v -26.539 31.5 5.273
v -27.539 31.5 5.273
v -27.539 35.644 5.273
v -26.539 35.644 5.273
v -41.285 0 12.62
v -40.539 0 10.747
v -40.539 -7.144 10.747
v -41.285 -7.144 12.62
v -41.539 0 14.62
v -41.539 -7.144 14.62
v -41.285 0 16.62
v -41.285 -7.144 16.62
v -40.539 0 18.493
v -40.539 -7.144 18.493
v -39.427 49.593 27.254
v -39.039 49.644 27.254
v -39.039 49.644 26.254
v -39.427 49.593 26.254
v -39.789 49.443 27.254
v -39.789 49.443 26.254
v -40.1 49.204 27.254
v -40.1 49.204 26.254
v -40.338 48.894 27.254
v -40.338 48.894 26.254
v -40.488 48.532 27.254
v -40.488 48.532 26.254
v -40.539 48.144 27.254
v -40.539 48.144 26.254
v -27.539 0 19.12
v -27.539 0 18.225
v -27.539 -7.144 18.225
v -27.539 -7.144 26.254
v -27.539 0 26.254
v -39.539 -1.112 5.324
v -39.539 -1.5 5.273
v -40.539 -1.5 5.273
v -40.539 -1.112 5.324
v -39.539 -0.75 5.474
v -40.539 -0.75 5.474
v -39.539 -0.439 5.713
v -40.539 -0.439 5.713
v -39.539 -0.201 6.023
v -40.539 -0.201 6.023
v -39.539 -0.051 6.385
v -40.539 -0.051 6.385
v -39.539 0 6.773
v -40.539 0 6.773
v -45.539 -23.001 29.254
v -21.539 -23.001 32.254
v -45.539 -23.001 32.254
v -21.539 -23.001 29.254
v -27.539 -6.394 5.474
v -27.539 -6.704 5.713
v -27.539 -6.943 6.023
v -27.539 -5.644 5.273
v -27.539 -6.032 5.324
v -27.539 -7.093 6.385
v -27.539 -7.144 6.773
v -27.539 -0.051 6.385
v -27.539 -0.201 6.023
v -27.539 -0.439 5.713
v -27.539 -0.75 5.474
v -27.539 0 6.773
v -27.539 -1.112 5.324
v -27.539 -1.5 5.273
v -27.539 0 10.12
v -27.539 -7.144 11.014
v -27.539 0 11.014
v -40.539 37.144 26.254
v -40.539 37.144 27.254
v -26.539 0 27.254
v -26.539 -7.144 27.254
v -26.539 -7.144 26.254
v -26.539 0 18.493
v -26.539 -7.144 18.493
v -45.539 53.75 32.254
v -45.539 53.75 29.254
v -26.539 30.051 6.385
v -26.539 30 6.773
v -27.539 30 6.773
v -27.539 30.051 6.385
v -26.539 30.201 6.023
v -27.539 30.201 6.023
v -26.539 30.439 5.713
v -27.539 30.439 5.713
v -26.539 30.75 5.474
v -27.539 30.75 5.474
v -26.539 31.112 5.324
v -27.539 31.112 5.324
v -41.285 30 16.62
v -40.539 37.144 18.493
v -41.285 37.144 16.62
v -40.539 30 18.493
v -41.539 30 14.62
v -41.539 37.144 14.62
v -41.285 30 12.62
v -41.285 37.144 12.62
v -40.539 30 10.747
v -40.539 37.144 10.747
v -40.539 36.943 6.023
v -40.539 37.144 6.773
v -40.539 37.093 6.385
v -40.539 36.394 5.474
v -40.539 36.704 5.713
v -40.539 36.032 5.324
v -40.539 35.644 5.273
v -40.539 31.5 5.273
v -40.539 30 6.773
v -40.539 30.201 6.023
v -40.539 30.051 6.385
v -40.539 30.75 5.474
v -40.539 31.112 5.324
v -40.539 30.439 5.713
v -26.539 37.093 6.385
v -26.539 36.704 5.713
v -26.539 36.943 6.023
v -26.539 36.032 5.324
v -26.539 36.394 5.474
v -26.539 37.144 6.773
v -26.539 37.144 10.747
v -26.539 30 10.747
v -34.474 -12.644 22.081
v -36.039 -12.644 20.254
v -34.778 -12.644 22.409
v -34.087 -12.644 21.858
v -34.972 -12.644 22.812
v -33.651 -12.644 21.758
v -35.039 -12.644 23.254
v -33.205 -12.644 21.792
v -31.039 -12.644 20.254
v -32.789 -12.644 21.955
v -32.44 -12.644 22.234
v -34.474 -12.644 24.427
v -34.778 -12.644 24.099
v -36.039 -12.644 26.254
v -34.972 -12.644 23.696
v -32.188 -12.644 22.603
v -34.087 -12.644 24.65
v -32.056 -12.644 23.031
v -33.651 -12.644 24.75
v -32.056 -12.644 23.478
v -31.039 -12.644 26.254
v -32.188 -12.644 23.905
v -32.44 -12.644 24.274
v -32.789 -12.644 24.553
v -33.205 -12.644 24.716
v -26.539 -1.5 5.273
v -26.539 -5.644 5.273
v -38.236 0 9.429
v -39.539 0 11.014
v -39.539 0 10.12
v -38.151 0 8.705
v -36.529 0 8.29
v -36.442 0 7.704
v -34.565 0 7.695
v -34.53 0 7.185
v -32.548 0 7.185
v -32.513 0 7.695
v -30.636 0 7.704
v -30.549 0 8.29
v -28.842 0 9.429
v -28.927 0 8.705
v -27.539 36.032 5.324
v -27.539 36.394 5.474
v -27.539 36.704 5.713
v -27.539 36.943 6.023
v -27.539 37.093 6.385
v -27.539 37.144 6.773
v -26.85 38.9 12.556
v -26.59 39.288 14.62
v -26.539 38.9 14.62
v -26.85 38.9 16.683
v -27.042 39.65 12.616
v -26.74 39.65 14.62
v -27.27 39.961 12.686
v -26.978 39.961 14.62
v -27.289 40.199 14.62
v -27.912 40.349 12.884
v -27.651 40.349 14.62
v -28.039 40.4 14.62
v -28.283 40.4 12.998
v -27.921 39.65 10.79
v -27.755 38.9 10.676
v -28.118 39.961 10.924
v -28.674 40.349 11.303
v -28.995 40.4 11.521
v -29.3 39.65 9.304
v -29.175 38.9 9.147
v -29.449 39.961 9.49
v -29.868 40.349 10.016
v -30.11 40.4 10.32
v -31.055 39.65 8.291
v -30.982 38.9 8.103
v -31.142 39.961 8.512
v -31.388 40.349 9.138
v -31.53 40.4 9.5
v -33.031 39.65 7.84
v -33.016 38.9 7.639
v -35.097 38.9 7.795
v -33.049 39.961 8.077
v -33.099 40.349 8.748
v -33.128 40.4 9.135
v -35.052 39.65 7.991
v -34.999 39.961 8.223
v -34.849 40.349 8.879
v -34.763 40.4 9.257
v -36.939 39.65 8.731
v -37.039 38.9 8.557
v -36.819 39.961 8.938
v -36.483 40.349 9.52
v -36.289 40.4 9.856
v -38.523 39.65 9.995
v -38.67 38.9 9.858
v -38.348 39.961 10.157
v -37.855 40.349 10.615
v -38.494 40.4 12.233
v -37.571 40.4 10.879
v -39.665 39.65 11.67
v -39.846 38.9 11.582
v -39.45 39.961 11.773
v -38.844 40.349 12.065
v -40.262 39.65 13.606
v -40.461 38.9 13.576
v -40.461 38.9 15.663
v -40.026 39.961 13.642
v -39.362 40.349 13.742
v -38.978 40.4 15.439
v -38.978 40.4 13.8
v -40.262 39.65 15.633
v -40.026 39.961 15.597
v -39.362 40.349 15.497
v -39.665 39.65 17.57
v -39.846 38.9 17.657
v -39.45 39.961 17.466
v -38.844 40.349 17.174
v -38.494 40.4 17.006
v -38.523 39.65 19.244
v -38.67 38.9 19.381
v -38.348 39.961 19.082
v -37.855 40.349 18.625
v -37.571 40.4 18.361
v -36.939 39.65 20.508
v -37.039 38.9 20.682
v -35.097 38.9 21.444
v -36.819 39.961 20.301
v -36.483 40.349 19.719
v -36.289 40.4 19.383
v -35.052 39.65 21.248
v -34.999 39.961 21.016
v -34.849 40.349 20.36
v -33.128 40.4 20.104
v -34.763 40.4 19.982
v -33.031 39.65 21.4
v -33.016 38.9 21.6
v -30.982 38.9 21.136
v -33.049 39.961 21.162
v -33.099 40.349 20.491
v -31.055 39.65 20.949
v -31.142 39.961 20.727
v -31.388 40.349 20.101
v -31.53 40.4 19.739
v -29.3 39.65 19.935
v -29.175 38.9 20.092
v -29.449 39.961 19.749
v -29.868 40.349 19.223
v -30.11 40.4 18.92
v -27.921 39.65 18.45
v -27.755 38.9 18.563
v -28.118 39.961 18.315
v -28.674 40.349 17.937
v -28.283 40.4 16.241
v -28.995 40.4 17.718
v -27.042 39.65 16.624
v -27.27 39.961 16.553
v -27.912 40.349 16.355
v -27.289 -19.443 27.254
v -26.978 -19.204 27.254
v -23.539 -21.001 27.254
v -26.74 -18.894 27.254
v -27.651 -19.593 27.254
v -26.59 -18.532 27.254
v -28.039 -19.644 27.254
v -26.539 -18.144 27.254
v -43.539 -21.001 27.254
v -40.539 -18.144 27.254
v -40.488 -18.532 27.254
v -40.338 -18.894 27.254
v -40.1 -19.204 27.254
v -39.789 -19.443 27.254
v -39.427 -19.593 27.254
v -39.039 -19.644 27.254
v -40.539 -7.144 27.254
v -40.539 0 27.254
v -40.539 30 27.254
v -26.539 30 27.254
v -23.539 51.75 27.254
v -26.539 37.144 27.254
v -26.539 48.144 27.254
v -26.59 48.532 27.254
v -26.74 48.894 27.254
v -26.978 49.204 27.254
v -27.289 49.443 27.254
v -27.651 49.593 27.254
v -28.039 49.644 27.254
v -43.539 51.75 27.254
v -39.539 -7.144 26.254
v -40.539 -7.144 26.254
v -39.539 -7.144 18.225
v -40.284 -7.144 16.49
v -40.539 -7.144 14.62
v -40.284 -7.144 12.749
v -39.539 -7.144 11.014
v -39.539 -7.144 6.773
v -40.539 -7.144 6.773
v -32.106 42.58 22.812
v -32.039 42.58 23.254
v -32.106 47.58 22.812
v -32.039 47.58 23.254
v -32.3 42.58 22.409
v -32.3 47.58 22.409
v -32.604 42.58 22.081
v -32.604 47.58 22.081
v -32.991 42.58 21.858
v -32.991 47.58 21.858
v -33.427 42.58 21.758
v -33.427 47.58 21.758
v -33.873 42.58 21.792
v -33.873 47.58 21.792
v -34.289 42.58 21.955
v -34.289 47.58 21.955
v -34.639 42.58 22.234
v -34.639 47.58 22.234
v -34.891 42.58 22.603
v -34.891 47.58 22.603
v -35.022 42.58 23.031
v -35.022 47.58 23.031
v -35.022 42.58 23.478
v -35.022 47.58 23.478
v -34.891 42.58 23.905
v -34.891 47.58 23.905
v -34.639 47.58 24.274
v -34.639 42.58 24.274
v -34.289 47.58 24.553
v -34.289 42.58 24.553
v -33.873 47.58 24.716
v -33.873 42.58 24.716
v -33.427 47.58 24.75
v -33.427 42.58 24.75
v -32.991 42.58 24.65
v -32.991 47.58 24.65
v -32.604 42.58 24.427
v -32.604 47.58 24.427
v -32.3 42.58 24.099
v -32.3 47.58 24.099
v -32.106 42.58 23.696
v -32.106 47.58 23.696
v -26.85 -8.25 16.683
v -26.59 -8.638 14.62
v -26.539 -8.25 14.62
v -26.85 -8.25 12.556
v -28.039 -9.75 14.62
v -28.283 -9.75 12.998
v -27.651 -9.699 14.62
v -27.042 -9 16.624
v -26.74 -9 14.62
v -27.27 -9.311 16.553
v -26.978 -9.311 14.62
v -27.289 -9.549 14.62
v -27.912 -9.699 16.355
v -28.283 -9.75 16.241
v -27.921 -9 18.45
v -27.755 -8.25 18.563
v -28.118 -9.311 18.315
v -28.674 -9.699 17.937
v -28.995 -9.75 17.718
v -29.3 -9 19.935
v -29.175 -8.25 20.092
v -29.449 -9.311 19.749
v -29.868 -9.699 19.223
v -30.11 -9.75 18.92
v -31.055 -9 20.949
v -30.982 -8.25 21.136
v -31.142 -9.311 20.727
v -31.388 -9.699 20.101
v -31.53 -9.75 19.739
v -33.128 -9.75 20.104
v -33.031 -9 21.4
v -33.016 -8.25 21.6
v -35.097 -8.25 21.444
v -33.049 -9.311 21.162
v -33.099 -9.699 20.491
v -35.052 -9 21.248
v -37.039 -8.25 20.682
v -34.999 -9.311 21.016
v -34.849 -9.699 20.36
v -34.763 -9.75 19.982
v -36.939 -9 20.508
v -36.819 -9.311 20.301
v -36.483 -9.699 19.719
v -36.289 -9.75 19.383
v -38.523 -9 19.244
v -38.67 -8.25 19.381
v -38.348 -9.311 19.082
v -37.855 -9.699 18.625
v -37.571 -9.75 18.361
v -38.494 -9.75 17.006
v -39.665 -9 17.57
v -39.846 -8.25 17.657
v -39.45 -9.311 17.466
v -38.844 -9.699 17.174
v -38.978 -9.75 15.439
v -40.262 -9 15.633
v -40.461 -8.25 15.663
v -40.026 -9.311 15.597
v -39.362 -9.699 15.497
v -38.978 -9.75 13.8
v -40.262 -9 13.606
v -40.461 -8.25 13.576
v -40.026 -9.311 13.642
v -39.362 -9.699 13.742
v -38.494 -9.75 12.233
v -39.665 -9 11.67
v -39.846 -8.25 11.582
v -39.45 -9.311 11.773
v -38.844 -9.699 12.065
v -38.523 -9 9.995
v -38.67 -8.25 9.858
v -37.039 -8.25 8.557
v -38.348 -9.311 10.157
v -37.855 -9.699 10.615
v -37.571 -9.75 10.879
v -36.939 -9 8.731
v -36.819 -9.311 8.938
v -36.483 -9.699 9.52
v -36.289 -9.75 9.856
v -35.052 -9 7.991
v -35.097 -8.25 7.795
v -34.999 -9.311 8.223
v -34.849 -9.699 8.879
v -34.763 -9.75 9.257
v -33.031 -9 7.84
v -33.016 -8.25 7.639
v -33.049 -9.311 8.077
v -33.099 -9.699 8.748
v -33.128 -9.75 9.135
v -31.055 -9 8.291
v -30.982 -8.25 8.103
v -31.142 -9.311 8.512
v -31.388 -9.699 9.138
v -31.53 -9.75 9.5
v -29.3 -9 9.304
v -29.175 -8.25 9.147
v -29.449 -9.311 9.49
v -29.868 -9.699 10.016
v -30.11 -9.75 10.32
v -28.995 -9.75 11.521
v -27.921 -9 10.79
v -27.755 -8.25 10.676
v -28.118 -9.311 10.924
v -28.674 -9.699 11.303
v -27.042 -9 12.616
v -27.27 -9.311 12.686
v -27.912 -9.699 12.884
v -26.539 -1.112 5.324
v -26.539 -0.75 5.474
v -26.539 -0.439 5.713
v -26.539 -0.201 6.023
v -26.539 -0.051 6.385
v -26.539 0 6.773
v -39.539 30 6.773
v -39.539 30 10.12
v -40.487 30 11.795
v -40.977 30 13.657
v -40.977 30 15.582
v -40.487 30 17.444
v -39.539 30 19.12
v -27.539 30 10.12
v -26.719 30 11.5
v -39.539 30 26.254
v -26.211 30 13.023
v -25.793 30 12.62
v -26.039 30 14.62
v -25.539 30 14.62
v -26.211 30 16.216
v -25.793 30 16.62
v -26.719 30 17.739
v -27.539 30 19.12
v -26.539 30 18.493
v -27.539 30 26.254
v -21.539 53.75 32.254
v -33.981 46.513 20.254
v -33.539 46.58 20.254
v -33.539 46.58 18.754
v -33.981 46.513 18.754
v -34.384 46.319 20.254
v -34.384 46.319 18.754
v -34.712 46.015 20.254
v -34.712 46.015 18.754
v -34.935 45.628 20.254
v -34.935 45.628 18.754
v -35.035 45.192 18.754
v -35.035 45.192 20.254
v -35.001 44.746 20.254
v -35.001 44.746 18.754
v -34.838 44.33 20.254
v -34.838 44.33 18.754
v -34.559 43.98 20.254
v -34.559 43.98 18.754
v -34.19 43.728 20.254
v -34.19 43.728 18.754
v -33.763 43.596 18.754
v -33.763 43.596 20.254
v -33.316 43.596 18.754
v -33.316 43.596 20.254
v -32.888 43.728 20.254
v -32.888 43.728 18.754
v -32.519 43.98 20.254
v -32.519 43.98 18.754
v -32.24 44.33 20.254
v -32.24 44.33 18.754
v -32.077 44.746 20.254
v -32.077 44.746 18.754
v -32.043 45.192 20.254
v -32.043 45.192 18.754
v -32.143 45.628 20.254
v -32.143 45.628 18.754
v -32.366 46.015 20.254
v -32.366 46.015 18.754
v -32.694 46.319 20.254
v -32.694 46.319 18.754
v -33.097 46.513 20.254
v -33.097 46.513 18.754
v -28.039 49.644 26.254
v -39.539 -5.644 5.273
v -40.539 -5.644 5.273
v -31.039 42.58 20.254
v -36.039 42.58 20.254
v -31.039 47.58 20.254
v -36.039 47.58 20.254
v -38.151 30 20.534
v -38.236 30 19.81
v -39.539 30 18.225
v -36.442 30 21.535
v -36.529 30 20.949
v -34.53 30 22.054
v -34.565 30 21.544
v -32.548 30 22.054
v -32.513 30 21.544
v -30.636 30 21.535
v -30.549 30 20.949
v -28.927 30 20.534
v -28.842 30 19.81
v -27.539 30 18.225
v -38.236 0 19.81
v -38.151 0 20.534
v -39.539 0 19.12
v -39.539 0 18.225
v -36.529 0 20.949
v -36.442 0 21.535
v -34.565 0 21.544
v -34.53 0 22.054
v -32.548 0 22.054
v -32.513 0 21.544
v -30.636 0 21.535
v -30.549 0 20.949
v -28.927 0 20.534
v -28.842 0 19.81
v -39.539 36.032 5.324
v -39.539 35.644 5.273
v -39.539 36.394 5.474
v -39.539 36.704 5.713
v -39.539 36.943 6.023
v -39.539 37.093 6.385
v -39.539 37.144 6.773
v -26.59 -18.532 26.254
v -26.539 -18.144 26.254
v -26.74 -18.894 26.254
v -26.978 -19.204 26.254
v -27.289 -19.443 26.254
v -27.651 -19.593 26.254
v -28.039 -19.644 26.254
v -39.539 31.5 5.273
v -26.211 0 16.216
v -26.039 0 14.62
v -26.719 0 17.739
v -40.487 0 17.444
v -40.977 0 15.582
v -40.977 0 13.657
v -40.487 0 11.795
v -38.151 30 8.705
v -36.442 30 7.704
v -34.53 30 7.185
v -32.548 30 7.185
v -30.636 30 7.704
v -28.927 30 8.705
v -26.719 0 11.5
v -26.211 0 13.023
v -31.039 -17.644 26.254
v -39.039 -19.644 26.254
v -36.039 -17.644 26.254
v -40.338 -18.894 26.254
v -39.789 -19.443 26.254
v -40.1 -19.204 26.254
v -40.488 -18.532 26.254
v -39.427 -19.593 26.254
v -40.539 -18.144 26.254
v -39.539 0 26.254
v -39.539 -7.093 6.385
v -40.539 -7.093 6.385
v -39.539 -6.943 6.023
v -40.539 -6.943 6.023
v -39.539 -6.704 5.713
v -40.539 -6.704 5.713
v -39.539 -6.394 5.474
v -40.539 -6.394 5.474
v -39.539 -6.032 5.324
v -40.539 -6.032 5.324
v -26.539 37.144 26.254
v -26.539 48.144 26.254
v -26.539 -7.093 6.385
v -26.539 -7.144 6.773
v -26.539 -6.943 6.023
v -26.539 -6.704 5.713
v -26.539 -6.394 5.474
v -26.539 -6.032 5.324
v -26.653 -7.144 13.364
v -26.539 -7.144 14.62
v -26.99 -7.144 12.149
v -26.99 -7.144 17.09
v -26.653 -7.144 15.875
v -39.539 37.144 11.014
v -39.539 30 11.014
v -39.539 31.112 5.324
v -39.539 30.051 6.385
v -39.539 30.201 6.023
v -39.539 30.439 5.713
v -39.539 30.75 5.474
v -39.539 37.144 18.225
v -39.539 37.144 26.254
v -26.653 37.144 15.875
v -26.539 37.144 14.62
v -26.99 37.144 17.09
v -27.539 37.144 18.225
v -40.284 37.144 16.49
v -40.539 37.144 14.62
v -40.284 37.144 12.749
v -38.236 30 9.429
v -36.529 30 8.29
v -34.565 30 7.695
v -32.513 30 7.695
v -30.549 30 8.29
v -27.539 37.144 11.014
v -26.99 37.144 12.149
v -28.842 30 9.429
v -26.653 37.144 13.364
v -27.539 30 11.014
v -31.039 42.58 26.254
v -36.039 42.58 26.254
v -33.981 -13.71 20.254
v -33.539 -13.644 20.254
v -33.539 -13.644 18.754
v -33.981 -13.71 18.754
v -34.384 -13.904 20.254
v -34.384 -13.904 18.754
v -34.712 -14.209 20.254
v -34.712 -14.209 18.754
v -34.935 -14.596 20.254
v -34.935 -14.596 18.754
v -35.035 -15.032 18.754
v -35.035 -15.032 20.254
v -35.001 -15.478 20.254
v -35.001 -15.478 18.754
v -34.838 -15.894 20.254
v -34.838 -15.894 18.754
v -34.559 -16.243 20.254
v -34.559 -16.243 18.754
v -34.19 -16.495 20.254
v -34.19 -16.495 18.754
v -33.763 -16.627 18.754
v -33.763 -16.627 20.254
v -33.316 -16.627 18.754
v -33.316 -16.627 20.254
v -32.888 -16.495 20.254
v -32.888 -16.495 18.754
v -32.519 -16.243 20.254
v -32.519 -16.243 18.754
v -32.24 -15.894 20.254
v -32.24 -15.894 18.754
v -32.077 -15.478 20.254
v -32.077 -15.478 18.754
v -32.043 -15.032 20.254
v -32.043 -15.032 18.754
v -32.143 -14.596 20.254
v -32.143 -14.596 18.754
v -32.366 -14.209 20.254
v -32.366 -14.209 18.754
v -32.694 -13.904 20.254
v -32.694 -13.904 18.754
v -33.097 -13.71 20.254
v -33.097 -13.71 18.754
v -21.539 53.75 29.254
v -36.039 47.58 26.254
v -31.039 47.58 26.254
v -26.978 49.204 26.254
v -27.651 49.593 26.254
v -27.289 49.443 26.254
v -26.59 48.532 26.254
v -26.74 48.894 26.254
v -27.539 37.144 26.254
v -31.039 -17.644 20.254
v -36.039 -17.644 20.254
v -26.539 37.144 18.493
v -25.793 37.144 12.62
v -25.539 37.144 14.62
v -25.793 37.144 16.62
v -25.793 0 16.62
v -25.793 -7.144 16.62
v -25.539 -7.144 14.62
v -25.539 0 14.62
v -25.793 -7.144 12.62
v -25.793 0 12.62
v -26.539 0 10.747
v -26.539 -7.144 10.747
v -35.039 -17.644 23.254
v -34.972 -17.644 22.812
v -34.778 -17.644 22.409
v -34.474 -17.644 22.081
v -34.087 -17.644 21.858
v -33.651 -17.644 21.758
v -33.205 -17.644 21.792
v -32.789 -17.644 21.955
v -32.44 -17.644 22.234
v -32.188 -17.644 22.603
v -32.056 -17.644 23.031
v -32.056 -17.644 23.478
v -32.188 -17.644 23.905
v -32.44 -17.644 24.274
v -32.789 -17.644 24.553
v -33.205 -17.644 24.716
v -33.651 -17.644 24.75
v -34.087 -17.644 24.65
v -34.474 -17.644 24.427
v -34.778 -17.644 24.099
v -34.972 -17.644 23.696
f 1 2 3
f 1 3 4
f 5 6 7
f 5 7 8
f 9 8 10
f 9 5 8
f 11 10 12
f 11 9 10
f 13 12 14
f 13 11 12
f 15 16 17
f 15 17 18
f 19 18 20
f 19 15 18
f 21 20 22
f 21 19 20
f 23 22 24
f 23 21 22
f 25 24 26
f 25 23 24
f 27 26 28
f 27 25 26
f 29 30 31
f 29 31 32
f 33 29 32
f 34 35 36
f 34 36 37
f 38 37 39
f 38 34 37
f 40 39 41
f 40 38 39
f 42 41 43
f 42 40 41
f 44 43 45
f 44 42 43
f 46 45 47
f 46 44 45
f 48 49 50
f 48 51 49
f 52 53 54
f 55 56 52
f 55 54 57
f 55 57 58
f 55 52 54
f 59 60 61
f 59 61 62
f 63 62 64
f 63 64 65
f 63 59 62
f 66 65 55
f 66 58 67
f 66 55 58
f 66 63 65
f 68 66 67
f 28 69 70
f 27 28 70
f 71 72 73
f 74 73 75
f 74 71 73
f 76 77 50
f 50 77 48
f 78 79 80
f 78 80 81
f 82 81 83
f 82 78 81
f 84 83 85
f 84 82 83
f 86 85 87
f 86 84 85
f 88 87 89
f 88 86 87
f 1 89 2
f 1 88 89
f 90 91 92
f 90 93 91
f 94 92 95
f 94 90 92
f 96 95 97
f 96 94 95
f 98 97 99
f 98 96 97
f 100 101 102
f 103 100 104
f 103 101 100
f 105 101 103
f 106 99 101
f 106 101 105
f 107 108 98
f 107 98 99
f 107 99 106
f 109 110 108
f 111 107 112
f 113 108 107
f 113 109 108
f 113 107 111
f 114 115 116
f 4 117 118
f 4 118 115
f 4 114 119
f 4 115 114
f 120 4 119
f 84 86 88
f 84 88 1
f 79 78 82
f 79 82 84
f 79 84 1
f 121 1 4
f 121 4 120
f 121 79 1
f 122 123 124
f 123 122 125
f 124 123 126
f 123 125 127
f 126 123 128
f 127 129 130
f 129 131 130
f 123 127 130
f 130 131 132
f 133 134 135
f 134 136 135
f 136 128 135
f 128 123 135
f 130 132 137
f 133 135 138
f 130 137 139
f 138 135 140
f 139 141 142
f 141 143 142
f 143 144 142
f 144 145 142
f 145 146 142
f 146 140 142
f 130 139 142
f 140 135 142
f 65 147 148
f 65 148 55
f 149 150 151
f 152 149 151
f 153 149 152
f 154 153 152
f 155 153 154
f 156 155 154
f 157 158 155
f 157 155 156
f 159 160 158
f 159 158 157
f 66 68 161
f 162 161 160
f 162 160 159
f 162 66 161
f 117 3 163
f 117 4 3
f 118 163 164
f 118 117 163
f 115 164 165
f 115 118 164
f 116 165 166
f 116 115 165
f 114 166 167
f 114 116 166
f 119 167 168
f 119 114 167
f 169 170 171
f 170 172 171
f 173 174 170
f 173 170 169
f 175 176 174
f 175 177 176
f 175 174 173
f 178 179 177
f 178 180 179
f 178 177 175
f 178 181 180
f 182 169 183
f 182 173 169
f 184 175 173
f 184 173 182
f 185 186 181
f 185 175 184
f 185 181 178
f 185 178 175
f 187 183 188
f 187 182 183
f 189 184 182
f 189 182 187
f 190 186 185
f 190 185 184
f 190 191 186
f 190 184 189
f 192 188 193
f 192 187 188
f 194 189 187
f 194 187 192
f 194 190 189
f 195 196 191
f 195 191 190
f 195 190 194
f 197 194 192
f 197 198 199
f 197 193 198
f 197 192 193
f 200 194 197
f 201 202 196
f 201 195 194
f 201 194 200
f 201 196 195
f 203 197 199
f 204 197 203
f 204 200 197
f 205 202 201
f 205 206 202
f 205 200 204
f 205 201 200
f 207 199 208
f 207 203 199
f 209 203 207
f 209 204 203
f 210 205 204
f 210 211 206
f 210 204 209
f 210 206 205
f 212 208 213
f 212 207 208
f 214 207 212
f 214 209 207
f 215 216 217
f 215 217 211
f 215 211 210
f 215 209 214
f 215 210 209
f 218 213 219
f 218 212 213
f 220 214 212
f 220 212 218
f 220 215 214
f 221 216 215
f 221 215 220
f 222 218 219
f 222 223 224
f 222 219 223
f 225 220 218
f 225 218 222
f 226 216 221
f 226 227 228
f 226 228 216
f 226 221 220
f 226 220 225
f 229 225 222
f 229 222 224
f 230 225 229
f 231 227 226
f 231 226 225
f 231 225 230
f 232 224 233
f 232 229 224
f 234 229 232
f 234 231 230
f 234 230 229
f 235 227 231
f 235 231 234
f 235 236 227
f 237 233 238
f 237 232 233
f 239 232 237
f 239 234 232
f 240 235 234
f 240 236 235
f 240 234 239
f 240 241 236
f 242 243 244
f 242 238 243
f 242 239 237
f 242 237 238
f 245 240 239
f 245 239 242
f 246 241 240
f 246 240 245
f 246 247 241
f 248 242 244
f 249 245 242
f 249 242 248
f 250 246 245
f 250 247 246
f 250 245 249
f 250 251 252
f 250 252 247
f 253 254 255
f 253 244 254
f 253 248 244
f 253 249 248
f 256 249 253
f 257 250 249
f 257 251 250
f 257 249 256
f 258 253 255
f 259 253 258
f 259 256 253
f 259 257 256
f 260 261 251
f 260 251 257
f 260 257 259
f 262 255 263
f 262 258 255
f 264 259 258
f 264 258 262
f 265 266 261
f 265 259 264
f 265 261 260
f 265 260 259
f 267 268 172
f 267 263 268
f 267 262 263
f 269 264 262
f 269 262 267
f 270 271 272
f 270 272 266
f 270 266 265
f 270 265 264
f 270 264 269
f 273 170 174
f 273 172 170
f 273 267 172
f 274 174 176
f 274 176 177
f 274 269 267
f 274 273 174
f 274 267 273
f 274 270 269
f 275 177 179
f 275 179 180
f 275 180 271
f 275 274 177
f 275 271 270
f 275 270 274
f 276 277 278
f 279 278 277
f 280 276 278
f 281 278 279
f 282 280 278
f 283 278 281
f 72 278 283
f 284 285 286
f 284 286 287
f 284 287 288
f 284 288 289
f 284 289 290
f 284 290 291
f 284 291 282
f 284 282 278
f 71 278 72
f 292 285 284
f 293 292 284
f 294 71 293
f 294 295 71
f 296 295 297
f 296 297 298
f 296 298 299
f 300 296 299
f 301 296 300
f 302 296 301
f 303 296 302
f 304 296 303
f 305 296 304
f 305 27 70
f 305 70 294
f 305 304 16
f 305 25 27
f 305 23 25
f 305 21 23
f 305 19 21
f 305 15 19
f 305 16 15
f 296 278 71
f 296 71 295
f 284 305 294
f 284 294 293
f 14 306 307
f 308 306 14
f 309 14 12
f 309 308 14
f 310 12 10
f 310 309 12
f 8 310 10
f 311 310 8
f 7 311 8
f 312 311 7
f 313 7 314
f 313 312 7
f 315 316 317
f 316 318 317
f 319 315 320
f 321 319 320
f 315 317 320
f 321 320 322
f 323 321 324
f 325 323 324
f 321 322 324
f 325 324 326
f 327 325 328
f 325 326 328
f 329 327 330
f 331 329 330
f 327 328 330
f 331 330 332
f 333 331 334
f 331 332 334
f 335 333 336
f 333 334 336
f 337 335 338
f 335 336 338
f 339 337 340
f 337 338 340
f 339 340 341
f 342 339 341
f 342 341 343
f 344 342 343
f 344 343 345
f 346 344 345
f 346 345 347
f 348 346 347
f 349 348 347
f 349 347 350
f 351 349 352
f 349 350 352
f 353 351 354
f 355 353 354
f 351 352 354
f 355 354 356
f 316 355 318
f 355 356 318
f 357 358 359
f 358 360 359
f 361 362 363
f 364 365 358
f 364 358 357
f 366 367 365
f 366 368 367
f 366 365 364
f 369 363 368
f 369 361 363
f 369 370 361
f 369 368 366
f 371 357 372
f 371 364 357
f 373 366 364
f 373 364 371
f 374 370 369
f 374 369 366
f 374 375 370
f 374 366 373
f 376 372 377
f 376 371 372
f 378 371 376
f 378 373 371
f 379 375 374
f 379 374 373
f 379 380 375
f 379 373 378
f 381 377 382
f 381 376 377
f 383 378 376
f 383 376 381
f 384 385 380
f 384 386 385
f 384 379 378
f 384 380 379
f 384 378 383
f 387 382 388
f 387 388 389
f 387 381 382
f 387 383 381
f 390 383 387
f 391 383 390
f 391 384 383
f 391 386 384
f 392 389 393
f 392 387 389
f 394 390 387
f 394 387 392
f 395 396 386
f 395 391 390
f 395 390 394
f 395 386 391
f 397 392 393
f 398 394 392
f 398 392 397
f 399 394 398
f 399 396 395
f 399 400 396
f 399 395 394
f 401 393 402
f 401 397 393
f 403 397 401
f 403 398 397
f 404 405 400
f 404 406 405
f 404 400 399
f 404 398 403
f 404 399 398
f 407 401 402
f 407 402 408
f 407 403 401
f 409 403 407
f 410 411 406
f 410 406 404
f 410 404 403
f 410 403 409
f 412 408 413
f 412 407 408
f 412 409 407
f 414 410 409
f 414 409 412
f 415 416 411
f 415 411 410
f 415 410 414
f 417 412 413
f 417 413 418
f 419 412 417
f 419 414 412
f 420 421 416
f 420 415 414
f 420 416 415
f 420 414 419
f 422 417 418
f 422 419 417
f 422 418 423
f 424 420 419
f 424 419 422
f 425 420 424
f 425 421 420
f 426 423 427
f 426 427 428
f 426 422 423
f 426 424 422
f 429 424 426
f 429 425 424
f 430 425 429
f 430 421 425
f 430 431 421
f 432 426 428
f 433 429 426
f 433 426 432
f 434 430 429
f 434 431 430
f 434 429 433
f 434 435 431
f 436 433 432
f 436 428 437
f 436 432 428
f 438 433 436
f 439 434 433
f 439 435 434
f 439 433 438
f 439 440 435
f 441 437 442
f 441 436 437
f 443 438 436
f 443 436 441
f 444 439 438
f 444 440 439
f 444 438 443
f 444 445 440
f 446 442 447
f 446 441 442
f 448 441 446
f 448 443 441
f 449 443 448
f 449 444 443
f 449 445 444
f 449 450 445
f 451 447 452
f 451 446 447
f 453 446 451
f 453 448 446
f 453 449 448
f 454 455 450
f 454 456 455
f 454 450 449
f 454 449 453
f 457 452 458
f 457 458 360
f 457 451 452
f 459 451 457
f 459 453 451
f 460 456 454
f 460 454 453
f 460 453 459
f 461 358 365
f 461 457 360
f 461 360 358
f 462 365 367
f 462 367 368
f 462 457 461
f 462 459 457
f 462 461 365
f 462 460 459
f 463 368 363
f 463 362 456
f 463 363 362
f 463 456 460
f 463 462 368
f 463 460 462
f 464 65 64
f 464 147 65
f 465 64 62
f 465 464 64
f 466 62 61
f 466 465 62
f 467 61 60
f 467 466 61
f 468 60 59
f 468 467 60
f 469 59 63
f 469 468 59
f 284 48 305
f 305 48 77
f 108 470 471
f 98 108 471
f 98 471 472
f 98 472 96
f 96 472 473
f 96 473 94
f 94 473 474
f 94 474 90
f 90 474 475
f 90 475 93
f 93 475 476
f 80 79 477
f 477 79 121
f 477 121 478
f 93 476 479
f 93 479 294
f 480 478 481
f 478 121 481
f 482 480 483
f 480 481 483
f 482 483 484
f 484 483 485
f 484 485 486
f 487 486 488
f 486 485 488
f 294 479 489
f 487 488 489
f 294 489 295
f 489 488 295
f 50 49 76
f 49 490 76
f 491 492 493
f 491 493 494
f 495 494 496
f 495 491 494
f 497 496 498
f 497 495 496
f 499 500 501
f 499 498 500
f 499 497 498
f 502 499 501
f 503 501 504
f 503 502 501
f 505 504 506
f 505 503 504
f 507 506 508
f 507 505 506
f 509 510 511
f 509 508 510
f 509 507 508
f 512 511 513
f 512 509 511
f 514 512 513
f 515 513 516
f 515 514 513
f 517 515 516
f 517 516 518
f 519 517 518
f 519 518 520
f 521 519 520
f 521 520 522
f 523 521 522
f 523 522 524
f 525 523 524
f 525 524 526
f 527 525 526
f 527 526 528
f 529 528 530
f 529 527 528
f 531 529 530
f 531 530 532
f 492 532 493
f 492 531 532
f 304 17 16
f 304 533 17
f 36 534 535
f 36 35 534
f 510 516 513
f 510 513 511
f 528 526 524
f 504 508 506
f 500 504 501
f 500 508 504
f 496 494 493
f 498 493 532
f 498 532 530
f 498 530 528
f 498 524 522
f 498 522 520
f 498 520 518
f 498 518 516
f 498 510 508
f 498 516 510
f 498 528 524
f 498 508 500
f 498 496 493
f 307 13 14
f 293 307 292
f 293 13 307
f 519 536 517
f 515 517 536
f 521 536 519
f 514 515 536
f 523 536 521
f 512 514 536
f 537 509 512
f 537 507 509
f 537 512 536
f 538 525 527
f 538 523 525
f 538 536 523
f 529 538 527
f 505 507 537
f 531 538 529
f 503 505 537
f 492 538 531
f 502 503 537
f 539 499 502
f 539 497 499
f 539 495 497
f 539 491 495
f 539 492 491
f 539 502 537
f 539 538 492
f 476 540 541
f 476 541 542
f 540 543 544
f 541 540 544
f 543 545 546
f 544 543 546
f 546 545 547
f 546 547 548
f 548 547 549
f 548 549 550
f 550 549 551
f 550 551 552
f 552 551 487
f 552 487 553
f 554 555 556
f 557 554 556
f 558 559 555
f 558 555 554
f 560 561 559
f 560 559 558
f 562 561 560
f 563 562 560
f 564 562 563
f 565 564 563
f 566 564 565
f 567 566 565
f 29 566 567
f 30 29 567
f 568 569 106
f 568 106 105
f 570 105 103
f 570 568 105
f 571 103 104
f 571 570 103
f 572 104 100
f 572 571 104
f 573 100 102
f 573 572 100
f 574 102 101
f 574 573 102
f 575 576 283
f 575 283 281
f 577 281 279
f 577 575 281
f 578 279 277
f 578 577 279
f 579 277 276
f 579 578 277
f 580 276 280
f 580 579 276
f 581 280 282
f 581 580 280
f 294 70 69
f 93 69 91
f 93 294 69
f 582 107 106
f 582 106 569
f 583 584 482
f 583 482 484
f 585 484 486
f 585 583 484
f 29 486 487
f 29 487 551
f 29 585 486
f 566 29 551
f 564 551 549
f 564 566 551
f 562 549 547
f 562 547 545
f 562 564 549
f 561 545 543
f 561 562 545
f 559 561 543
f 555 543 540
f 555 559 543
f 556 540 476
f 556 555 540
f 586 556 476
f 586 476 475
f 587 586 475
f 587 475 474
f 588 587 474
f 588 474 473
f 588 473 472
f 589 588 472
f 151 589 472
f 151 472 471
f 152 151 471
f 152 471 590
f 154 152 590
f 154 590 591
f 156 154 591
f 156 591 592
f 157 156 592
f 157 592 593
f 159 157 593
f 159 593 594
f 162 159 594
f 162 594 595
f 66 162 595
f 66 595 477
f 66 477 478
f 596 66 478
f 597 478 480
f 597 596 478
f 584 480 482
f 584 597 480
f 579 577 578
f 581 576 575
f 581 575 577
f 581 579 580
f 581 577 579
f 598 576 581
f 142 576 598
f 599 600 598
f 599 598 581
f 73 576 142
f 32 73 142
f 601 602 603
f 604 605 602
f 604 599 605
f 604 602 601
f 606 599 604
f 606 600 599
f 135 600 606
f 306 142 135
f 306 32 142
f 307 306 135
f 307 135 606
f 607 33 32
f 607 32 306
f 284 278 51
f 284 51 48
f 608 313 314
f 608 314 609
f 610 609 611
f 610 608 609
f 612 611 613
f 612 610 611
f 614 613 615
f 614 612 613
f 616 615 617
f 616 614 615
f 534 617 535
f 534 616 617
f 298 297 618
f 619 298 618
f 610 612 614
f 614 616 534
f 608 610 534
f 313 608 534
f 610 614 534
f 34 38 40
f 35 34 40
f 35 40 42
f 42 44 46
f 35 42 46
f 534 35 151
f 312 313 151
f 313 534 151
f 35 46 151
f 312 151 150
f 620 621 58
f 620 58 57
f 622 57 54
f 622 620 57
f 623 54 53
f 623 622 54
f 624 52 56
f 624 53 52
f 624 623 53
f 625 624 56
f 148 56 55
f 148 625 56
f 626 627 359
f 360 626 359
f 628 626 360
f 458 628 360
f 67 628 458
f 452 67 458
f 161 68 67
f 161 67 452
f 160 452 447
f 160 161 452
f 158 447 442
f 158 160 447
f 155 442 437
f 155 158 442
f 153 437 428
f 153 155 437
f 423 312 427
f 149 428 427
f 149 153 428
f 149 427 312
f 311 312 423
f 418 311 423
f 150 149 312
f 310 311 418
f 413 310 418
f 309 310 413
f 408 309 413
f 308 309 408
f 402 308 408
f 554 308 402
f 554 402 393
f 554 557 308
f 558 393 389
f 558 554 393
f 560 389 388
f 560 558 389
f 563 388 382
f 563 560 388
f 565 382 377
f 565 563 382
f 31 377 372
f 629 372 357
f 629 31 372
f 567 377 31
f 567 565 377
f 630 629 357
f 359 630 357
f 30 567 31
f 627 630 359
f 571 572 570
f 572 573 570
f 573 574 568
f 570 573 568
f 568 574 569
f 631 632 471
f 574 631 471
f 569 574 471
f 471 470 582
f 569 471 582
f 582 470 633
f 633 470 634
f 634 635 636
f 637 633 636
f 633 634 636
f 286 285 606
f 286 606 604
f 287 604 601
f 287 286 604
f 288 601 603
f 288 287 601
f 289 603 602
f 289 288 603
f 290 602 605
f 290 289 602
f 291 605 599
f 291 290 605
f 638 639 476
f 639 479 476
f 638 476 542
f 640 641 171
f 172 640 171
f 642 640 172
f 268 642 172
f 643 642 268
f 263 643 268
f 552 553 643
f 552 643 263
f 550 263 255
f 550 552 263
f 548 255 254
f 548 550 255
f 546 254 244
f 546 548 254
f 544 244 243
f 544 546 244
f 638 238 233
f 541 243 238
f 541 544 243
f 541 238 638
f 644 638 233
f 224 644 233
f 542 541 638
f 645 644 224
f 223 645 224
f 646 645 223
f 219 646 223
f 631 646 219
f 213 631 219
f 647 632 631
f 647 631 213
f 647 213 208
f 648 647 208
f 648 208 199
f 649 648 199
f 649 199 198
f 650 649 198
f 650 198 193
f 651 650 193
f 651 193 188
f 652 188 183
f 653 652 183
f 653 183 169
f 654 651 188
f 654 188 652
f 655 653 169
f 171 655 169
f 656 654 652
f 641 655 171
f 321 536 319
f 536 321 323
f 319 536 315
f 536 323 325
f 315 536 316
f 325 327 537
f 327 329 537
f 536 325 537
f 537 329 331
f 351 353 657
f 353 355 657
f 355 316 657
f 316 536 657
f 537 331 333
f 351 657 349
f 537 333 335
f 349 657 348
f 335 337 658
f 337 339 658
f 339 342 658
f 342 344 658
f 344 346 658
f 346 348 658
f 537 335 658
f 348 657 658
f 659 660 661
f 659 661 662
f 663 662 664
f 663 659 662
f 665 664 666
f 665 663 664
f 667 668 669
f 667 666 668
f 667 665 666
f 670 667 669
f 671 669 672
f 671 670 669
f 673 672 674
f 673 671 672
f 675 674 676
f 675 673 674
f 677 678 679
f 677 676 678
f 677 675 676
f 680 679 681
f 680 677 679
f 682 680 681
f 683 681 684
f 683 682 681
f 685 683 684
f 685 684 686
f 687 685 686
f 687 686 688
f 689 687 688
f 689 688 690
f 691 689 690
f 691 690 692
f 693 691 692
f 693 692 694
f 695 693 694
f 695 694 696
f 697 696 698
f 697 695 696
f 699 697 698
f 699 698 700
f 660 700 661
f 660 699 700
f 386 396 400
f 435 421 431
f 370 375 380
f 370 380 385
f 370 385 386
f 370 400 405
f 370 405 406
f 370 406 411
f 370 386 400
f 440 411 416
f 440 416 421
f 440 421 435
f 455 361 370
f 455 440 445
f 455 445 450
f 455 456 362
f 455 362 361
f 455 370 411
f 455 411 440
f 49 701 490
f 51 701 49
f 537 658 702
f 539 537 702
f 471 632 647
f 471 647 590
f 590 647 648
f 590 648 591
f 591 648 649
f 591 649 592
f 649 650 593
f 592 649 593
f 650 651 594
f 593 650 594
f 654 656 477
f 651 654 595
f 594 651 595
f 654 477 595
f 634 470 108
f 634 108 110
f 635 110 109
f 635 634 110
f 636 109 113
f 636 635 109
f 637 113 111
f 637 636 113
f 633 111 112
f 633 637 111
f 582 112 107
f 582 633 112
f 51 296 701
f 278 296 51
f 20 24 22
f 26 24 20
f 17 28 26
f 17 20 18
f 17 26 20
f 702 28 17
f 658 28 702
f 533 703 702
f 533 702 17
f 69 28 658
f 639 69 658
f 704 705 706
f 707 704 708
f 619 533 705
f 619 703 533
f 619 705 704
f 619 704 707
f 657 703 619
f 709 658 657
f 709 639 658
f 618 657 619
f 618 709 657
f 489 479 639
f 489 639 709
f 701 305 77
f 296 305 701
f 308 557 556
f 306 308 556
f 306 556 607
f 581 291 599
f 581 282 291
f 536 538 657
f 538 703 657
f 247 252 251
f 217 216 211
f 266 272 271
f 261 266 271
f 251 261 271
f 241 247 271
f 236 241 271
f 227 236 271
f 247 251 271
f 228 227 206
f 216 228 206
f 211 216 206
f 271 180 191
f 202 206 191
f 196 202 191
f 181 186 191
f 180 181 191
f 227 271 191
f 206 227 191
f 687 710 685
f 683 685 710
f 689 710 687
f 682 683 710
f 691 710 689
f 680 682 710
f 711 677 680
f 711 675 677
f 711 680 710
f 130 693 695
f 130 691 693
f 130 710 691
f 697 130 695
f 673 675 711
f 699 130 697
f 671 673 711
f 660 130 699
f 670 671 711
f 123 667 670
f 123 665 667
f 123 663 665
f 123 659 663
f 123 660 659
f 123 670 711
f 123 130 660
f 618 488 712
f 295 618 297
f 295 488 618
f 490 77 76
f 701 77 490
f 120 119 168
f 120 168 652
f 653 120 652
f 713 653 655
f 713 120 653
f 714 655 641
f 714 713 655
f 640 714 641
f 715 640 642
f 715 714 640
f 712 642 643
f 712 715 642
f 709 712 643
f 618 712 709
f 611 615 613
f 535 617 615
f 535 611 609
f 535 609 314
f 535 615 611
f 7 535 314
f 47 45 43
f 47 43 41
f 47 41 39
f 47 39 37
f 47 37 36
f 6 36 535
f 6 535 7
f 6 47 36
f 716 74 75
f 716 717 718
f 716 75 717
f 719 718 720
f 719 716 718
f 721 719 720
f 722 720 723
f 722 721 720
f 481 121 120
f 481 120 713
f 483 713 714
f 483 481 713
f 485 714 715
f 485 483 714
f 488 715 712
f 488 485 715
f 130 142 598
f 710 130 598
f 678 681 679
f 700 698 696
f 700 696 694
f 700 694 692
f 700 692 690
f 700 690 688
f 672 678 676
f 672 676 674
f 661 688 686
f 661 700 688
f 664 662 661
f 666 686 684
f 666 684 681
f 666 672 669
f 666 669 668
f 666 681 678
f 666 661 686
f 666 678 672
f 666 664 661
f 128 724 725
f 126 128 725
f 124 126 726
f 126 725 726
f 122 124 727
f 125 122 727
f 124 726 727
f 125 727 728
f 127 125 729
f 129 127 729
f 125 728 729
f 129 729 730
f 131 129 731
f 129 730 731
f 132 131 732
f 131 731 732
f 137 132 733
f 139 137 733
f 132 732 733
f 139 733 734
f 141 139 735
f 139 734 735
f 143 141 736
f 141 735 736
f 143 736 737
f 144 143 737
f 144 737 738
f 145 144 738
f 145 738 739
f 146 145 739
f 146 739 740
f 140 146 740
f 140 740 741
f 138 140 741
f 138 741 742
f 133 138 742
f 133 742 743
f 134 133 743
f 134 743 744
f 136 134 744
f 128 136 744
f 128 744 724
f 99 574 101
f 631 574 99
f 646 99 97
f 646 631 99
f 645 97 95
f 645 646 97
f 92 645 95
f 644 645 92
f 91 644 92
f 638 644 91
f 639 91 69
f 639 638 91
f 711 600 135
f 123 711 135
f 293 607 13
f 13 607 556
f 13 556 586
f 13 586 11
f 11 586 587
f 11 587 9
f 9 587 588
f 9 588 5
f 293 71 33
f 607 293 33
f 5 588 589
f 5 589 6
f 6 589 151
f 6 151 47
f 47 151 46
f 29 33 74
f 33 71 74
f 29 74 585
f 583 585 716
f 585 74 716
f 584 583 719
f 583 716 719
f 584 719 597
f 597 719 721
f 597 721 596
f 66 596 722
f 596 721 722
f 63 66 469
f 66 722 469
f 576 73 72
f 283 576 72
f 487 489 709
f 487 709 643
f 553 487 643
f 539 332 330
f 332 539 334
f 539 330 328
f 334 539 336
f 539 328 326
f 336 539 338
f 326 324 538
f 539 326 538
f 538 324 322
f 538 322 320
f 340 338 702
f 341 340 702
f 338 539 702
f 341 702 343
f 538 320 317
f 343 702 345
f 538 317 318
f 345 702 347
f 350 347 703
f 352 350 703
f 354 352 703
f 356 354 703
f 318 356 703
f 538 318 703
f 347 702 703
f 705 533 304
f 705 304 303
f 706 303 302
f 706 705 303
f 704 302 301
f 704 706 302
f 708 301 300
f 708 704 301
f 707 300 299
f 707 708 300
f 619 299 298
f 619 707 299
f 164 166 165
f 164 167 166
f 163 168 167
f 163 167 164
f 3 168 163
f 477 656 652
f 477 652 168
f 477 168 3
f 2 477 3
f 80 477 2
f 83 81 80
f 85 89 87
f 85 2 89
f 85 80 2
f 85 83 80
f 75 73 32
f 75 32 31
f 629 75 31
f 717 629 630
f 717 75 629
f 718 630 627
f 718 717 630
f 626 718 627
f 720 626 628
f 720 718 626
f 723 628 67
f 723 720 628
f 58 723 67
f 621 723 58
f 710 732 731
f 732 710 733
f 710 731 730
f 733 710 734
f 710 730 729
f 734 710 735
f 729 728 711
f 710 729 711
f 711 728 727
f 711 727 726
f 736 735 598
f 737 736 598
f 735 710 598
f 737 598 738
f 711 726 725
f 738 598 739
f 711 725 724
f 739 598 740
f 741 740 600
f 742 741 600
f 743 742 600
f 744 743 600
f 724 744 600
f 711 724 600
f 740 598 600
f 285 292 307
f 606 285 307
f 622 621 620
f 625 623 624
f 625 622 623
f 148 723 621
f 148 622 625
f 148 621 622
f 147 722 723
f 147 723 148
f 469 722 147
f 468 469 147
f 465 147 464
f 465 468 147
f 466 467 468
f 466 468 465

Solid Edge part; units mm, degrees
sketch "Sketch1" plane through (0, 0, 0) normal (0, -1, 0) x (1, 0, 0)
  circle A0 centre (-33.5391, 14.6196) radius 7.5
extrude "Protrusion1" add sketch "Sketch1" against normal blind 30
sketch "Sketch2" plane through (-33.5391, 0, 14.6196) normal (0, -1, 0) x (1, 0, 0)
  circle A0 centre (0, 0) radius 7
extrude "ExtrudedProtrusion_2" add sketch "Sketch2" along normal blind 9.75 and the other way blind 40.4
fillet "Round_1" radius 1.5 2 edges at (-40.5391, -9.75, 14.6196) (-40.5391, 40.4, 14.6196)
sketch "Sketch3" plane through (-33.5391, 30, 14.6196) normal (0, 1, 0) x (1, 0, 0)
  line L0 (-6, -11.6345) -> (-6, -3.6056)
  arc A0 (-6, -3.6056) -> (-6, 3.6056) centre (0, 0) cw
  line L1 (-6, 3.6056) -> (-6, 9.3463)
  line L2 (-7, 9.3463) -> (-6, 9.3463)
  line L3 (-7, 3.873) -> (-7, 9.3463)
  arc A1 (-7, -3.873) -> (-7, 3.873) centre (0, 0) cw
  line L4 (-7, -12.6345) -> (-7, -3.873)
  line L5 (7, -12.6345) -> (-7, -12.6345)
  line L6 (7, -3.873) -> (7, -12.6345)
  arc A2 (7, 3.873) -> (7, -3.873) centre (0, 0) cw
  line L7 (7, 9.3463) -> (7, 3.873)
  line L8 (6, 9.3463) -> (7, 9.3463)
  line L9 (6, 3.6056) -> (6, 9.3463)
  line L10 (6, -11.6345) -> (6, -3.6056)
  line L11 (-6, -11.6345) -> (6, -11.6345)
  arc A3 (6, 3.6056) -> (6, -3.6056) centre (0, 0) cw
extrude "ExtrudedProtrusion_3" add sketch "Sketch3" along normal blind 7.1438
sketch "Sketch4" plane through (-33.5391, 37.1438, 16.2637) normal (0, 1, 0) x (1, 0, 0)
  line L0 (7, -9.9904) -> (-7, -9.9904)
  line L1 (-7, -9.9904) -> (-7, -10.9904)
  line L2 (-7, -10.9904) -> (7, -10.9904)
  line L3 (7, -10.9904) -> (7, -9.9904)
extrude "ExtrudedProtrusion_4" add sketch "Sketch4" along normal blind 12.5
fillet "Round_2" radius 1.5 6 edges at (-40.0391, 37.1438, 5.2733) (-40.0391, 30, 5.2733) (-27.0391, 30, 5.2733) (-27.0391, 37.1438, 5.2733) (-26.5391, 49.6437, 26.7541) (-40.5391, 49.6437, 26.7541)
mirror "Mirror1" about plane through (0, 15, 0) normal (0, -1, 0) of "ExtrudedProtrusion_4", "ExtrudedProtrusion_3"
fillet "Round1" radius 1.5 6 edges at (-40.0391, -7.1438, 5.2733) (-40.0391, 0, 5.2733) (-27.0391, 0, 5.2733) (-27.0391, -7.1438, 5.2733) (-26.5391, -19.6438, 26.7541) (-40.5391, -19.6438, 26.7541)
sketch "Sketch5" plane through (-33.5391, 49.8219, 27.2541) normal (0, 0, 1) x (1, 0, 0)
  line L0 (12, 3.928) -> (12, -72.823)
  line L1 (12, -72.823) -> (-12, -72.823)
  line L2 (-12, 3.928) -> (-12, -72.823)
  line L3 (-12, 3.928) -> (12, 3.928)
  dimension "D1" = 24
extrude "ExtrudedProtrusion_7" add sketch "Sketch5" along normal blind 5
chamfer "Chamfer_1" distance 2 angle 45 4 edges at (-33.5391, 53.7499, 27.2541) (-45.5391, 15.3744, 27.2541) (-33.5391, -23.0011, 27.2541) (-21.5391, 15.3744, 27.2541)
sketch "Sketch6" plane through (-33.5391, 39.8219, 26.2541) normal (0, 0, -1) x (0, -1, 0)
  line L0 (-7.7578, -2.5) -> (-2.7578, -2.5)
  line L1 (-2.7578, -2.5) -> (-2.7578, 2.5)
  line L2 (-2.7578, 2.5) -> (-7.7578, 2.5)
  line L3 (-7.7578, 2.5) -> (-7.7578, -2.5)
  line L4 (52.4656, -2.5) -> (57.4656, -2.5)
  line L5 (57.4656, -2.5) -> (57.4656, 2.5)
  line L6 (57.4656, 2.5) -> (52.4656, 2.5)
  line L7 (52.4656, 2.5) -> (52.4656, -2.5)
extrude "ExtrudedProtrusion_8" add sketch "Sketch6" along normal blind 6
sketch "Sketch7" plane through (-33.5391, 47.5797, 22.7541) normal (0, 1, 0) x (1, 0, 0)
  circle A0 centre (0, -0.5) radius 1.5
extrude "Cutout1" cut sketch "Sketch7" against normal up to next
sketch "Sketch8" plane through (-33.5391, -17.6438, 22.7541) normal (0, -1, 0) x (-1, 0, 0)
  circle A0 centre (0, -0.5) radius 1.5
extrude "Cutout2" cut sketch "Sketch8" against normal up to next
sketch "Sketch9" plane through (-33.5391, 45.0797, 20.2541) normal (0, 0, -1) x (0, 1, 0)
  circle A0 centre (0, 0) radius 1.5
  circle A1 centre (-60.2235, 0) radius 1.5
extrude "ExtrudedProtrusion_9" add sketch "Sketch9" along normal blind 1.5
